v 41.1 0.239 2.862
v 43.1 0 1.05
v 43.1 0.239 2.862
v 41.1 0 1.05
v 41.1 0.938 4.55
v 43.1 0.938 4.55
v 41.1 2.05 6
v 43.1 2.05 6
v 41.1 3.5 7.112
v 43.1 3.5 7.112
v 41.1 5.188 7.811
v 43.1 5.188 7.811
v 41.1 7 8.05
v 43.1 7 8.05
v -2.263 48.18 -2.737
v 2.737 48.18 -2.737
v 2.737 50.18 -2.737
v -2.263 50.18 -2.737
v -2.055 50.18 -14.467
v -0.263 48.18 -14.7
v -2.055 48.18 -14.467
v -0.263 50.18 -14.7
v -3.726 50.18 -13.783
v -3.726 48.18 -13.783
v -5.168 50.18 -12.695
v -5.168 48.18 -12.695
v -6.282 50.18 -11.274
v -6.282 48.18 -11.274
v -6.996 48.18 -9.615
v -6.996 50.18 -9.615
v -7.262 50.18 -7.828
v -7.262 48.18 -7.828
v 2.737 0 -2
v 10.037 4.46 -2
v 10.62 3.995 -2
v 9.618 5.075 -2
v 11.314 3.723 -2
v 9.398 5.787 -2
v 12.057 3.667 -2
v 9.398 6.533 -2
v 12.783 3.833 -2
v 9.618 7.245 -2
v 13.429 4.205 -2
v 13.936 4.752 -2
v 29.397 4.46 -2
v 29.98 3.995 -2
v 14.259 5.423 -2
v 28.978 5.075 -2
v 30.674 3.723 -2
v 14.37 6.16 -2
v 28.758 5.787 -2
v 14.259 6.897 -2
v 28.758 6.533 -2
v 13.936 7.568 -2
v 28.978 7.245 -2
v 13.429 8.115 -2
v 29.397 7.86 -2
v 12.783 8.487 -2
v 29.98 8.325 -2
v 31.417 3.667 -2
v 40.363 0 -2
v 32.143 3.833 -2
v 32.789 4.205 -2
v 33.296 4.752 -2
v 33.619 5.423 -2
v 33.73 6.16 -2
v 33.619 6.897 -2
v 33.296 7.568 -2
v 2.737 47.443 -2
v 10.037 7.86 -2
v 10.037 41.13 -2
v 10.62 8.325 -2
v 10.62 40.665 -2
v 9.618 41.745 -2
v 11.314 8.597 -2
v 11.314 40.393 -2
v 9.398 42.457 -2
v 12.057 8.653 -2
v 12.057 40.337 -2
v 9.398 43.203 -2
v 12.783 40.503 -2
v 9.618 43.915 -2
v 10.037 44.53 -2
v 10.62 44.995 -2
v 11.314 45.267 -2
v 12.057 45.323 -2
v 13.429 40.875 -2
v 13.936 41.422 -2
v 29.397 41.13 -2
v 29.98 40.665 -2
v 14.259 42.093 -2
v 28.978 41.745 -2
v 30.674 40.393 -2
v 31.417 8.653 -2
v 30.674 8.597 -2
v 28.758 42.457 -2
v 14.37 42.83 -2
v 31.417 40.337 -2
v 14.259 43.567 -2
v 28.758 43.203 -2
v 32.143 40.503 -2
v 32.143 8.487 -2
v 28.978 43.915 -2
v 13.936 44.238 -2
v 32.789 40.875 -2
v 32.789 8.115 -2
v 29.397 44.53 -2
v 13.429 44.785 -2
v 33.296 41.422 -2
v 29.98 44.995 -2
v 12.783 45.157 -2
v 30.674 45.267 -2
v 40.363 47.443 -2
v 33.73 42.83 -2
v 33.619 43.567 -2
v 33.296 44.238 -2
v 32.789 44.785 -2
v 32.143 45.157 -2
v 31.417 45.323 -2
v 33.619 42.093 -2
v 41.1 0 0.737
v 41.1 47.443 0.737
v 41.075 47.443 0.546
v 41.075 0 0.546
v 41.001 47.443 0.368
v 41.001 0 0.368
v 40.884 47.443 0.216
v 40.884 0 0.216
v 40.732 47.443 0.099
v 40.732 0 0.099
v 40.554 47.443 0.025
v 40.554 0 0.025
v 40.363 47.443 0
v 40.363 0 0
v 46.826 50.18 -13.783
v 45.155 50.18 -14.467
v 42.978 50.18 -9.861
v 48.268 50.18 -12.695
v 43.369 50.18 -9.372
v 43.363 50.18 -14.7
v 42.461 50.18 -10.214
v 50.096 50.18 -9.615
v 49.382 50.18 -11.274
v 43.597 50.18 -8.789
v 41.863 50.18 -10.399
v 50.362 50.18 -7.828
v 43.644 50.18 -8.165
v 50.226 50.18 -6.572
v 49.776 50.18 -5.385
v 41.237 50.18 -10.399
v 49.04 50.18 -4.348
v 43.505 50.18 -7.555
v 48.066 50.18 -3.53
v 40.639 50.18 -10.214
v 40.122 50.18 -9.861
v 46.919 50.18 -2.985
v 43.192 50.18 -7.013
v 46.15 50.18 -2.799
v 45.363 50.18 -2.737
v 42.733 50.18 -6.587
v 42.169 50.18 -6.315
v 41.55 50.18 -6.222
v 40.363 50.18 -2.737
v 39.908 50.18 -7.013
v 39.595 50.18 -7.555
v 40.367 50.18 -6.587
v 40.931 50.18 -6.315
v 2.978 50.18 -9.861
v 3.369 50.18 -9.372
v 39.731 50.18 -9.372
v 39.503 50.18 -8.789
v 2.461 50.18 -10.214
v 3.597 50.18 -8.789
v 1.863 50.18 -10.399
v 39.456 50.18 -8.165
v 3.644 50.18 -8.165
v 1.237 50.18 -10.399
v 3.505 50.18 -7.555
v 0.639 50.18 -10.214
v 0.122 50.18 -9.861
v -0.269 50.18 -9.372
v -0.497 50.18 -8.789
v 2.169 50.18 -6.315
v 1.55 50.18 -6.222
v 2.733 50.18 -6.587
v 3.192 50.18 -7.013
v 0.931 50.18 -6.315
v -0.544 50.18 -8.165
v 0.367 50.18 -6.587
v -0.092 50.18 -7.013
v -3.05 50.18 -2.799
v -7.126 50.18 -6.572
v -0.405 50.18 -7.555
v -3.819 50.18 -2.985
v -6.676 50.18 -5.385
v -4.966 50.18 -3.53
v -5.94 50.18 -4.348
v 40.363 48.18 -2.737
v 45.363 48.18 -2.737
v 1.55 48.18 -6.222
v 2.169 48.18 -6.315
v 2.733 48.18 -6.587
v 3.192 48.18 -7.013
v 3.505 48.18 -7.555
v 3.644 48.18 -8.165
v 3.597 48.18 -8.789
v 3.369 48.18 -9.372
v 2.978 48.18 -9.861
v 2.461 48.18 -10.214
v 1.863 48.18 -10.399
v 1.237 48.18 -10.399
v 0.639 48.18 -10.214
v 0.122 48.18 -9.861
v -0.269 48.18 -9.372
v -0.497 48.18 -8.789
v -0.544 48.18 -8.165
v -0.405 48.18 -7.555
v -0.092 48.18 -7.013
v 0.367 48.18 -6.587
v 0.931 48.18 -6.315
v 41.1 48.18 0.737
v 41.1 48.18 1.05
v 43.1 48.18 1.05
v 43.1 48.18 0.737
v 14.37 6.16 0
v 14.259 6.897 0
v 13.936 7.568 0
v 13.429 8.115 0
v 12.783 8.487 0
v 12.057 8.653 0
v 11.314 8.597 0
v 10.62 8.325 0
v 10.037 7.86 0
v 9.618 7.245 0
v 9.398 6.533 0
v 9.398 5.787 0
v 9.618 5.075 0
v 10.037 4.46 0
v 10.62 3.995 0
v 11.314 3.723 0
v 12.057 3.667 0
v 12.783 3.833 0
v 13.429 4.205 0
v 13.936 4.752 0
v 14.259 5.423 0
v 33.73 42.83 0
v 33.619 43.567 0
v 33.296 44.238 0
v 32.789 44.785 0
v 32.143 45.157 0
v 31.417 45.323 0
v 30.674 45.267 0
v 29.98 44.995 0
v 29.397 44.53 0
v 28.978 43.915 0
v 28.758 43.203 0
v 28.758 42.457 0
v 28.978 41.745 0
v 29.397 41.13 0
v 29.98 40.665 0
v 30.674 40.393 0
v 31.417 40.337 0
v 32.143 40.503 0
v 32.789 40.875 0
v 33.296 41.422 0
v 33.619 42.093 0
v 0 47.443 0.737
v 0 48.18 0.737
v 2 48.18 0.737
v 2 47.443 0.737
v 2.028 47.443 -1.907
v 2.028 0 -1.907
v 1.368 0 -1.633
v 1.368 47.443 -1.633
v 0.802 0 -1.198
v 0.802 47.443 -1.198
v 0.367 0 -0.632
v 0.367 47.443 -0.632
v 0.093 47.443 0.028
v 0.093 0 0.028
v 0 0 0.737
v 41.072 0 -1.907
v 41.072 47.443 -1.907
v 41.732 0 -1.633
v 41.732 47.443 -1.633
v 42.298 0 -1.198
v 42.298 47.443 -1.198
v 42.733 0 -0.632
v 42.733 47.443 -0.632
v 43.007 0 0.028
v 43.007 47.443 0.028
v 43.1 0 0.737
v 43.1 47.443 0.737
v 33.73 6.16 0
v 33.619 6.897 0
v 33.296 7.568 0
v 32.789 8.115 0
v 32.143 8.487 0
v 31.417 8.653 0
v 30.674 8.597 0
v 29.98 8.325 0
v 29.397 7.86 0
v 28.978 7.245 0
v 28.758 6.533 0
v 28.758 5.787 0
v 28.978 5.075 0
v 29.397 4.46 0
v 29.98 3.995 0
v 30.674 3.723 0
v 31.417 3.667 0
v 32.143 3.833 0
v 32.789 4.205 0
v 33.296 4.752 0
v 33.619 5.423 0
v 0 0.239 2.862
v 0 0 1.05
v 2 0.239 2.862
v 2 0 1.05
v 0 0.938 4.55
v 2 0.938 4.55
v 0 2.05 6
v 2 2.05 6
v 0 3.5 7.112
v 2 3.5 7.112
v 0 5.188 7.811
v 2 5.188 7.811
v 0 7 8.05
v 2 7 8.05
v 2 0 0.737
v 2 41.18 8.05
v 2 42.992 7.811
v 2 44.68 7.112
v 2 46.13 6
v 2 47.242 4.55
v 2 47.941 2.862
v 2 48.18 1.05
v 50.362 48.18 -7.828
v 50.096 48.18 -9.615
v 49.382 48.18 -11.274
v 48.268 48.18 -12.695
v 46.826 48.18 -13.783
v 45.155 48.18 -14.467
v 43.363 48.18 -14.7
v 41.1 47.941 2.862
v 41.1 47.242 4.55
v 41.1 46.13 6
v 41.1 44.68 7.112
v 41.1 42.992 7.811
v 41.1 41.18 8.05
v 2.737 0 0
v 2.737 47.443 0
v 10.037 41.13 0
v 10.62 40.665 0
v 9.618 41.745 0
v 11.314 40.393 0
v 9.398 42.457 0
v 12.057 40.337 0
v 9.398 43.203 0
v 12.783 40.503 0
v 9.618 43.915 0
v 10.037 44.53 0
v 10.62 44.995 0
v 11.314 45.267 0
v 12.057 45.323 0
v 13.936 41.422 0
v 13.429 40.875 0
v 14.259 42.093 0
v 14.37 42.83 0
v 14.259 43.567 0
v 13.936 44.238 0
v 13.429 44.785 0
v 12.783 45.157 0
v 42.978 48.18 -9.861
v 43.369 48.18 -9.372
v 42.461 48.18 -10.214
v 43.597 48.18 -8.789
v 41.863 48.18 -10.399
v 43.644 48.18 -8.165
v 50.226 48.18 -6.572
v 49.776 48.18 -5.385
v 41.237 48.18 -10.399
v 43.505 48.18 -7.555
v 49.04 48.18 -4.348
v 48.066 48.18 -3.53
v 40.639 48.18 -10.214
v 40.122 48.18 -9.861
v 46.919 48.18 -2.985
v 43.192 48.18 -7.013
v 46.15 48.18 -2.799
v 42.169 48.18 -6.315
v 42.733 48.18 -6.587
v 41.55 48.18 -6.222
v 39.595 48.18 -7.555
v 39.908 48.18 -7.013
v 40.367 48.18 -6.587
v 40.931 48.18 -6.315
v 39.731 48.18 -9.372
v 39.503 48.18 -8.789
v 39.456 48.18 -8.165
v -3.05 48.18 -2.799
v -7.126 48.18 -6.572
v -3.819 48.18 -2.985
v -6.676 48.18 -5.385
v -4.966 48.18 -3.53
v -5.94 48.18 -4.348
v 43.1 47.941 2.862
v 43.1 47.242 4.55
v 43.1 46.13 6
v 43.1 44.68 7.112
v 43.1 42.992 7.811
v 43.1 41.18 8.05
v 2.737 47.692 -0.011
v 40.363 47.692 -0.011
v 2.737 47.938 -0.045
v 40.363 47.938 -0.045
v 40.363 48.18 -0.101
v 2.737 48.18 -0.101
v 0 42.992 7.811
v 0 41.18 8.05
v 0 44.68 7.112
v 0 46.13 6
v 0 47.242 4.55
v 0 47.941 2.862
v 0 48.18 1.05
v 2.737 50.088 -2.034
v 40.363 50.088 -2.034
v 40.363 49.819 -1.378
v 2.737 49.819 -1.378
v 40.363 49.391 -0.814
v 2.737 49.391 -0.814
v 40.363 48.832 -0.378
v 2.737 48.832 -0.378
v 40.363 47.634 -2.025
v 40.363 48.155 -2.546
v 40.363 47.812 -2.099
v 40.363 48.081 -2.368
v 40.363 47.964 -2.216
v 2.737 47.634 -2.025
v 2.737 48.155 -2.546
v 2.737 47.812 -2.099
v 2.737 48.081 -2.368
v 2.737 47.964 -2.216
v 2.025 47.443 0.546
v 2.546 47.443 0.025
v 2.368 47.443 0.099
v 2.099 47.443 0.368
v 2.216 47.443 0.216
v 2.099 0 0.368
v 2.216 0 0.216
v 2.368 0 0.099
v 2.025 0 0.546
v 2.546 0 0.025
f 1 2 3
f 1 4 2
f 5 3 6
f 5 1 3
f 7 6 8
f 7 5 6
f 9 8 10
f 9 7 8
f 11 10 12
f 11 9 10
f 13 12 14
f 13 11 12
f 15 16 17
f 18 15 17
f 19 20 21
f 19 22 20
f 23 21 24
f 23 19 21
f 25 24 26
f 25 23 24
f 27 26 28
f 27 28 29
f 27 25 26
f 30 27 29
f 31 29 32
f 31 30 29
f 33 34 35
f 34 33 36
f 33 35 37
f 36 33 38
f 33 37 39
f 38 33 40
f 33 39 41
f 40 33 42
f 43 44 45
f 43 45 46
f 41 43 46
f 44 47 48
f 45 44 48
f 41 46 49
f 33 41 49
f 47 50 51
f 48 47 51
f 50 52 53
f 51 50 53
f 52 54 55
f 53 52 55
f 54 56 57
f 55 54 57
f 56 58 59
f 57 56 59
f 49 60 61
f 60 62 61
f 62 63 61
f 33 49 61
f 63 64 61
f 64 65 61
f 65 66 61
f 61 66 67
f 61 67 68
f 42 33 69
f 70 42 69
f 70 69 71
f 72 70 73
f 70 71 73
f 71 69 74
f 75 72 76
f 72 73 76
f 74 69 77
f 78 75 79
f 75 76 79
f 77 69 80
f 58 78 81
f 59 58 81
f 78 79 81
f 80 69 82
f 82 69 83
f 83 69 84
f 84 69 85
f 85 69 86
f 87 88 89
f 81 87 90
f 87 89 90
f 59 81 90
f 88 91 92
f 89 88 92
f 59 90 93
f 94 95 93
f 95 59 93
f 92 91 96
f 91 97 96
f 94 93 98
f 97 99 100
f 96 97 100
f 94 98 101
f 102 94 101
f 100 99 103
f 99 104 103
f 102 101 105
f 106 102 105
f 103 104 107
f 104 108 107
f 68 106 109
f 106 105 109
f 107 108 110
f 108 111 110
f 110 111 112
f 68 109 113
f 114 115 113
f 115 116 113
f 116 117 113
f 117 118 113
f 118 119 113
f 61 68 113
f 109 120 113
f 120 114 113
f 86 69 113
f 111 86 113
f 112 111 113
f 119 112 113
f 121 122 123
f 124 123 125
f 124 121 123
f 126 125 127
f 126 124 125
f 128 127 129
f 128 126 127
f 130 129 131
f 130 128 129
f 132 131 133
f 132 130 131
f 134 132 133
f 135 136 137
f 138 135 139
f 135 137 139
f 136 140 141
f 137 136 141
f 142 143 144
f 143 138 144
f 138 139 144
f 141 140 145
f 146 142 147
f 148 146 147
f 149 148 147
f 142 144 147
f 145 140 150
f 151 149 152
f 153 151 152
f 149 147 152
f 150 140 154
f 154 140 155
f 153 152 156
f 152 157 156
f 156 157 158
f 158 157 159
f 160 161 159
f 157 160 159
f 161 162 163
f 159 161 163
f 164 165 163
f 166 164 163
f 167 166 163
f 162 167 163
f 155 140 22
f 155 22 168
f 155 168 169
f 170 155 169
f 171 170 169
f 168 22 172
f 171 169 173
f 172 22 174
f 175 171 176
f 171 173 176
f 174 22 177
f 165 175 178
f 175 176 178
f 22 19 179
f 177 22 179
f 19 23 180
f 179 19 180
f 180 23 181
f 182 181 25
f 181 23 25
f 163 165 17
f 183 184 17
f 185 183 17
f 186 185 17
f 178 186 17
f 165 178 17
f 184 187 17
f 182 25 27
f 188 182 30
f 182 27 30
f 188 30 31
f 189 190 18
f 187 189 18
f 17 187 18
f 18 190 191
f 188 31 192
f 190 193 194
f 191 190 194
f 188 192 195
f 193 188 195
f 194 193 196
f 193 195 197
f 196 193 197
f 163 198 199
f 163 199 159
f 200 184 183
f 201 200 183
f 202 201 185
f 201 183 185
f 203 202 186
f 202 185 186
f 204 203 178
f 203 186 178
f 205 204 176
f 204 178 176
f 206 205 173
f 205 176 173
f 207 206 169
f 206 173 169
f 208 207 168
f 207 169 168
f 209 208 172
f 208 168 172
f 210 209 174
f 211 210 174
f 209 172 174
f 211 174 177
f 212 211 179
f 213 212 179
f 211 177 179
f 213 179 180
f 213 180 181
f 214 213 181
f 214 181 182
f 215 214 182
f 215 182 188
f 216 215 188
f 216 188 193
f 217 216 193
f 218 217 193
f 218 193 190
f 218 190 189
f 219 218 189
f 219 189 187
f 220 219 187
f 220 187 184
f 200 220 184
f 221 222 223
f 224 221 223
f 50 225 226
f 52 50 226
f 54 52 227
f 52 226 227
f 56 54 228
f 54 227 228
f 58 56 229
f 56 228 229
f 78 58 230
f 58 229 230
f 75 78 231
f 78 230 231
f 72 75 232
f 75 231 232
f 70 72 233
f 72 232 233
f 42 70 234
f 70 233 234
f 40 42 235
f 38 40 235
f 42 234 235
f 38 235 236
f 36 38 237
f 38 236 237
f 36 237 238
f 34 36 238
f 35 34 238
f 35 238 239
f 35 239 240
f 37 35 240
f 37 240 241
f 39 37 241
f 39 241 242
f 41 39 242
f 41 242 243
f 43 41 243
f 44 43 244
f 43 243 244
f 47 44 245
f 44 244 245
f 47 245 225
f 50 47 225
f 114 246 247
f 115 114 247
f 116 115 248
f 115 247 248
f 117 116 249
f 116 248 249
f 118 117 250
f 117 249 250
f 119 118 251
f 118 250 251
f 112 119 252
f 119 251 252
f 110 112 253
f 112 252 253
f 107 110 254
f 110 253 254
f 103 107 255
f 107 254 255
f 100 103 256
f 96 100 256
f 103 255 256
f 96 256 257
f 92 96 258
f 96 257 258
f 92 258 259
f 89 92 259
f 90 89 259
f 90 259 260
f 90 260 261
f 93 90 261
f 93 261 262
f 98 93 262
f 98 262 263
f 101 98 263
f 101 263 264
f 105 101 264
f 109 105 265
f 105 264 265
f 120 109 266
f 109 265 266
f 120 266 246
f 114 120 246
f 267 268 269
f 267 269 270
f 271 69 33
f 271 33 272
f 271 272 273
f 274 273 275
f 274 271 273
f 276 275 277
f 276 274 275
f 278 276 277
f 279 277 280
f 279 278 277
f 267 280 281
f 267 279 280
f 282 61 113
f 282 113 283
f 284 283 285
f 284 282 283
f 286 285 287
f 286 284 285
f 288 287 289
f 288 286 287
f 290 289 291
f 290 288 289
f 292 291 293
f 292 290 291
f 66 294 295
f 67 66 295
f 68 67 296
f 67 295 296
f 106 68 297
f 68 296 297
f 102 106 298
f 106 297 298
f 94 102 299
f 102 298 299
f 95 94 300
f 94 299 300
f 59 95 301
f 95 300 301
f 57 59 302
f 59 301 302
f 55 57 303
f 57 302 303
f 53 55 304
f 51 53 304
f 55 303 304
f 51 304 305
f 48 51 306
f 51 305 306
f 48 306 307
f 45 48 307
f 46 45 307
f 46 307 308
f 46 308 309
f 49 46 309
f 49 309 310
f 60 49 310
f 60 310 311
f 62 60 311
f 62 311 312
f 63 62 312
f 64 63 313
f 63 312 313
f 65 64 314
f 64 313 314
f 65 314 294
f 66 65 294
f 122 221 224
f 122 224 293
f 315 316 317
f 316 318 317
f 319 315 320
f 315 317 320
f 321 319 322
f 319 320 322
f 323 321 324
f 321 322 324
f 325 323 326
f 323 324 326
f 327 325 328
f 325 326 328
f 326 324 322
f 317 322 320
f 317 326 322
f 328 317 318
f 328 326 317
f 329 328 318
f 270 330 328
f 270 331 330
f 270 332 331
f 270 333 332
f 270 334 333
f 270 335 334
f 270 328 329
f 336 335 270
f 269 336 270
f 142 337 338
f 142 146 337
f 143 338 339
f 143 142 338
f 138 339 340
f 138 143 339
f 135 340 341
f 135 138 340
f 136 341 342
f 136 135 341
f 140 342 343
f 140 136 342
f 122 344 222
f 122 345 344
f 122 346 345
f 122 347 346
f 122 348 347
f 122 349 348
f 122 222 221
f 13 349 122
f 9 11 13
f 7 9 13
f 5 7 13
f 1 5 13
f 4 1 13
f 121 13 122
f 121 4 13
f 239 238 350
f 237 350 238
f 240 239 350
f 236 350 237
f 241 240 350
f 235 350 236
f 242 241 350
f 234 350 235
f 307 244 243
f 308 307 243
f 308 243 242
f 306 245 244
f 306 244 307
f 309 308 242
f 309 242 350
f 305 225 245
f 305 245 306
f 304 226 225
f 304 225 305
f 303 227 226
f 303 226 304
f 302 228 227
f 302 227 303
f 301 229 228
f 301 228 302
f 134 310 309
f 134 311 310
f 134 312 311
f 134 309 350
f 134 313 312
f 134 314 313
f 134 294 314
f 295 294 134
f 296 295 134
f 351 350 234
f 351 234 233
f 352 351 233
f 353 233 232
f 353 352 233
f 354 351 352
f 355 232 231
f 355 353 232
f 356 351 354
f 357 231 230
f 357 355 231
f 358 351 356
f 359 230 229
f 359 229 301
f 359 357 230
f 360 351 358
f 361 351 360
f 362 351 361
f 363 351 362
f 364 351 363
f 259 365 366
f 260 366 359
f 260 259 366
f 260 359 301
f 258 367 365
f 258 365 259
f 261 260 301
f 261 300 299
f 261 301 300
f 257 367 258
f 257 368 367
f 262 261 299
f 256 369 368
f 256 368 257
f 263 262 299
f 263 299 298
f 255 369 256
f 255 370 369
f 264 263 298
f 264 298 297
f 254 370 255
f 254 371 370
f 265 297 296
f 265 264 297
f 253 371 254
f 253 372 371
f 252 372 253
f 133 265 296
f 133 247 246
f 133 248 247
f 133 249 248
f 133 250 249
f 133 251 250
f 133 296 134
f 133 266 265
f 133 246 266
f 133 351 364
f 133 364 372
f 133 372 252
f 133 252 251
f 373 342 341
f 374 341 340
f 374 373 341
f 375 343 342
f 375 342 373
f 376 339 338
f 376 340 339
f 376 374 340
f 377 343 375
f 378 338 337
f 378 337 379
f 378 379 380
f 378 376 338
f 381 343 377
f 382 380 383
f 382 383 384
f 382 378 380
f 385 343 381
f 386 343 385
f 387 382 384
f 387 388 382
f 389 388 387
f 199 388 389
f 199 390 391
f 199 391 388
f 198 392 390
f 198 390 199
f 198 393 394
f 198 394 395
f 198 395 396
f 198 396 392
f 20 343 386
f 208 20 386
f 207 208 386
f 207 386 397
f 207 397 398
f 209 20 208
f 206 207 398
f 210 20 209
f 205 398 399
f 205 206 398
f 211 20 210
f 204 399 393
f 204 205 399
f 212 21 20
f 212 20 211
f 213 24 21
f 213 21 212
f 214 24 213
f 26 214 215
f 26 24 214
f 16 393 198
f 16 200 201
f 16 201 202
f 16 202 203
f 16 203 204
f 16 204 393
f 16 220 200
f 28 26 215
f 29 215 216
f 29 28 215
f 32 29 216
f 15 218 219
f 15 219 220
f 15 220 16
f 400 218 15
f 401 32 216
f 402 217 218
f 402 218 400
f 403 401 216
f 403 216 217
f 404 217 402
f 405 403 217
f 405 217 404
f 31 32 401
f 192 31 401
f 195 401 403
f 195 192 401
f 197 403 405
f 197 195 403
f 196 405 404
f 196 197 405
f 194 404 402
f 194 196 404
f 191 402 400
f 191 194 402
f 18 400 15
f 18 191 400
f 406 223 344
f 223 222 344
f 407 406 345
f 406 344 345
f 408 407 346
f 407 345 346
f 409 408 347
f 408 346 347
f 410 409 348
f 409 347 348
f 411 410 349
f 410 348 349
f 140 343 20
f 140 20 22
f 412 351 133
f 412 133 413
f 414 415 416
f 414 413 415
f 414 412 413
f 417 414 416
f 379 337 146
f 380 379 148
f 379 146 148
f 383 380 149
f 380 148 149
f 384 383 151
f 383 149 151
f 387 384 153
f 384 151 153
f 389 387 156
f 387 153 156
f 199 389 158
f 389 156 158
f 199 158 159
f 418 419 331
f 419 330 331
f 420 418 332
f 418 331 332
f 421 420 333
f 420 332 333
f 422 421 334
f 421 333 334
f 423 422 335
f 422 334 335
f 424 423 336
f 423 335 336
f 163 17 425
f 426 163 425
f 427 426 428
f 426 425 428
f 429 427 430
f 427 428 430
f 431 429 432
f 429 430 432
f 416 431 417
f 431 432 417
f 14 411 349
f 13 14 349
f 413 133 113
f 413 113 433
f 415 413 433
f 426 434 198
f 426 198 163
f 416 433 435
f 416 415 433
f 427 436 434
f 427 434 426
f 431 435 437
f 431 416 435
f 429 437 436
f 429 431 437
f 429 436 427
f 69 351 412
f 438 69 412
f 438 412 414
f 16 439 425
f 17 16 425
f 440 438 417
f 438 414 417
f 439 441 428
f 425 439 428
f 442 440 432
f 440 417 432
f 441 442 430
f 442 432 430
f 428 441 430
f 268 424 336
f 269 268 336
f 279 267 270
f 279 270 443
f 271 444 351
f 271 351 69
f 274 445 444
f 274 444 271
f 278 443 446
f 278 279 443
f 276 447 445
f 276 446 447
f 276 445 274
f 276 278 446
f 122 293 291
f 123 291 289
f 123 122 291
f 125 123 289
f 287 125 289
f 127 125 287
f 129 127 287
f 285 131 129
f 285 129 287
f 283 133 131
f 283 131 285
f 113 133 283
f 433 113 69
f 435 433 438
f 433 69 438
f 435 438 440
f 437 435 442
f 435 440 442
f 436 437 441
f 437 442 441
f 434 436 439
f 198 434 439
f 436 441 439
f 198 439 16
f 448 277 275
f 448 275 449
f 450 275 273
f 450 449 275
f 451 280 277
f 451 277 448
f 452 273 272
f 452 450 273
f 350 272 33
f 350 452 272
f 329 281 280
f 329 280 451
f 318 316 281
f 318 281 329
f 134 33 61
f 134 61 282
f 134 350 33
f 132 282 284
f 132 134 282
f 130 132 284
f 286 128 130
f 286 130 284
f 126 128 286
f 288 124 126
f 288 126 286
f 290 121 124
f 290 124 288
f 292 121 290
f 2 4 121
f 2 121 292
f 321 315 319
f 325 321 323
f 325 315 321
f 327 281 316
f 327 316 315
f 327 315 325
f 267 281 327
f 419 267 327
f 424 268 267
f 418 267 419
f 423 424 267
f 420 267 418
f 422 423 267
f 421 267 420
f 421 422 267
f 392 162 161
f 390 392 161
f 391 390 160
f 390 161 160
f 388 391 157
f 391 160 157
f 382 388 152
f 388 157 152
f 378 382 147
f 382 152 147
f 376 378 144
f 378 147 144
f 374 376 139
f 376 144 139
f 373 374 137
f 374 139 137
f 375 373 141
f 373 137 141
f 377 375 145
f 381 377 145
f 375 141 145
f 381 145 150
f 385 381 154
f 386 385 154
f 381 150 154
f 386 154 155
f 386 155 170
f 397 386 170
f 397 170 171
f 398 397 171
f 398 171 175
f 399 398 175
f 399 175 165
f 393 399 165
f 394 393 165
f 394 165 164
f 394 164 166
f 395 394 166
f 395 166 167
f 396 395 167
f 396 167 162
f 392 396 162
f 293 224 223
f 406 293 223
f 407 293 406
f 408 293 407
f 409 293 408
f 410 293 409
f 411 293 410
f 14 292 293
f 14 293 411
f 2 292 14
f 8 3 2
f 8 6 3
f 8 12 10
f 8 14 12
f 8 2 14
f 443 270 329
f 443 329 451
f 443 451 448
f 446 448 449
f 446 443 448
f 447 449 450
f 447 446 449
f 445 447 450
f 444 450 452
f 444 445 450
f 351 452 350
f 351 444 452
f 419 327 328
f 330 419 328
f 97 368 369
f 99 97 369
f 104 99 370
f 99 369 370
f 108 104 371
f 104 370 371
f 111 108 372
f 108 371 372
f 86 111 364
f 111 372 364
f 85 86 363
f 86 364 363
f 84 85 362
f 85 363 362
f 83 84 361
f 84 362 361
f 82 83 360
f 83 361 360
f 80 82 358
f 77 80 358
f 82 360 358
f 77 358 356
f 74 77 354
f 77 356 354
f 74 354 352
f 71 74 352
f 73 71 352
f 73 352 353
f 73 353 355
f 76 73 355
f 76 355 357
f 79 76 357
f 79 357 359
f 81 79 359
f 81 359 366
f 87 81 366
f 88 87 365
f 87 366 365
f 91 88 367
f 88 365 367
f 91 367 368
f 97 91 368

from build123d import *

# Parameters (mm, degrees)
SKETCH6_W                      = 43.1
SKETCH6_H                      = 48.18
SKETCH6_R                      = 2.5
BASE_FLANGE2_DEPTH             = 2
EDGE_FLANGE1_STRIP_W           = 9.4732
EDGE_FLANGE1_STRIP_H           = 2
EDGE_FLANGE1_STRIP_CUT_DEPTH   = 48.18
EDGE_FLANGE1_STRIP_2_W         = 9.4732
EDGE_FLANGE1_STRIP_2_H         = 2
EDGE_FLANGE1_STRIP_CUT_2_DEPTH = 48.18
EDGE_FLANGE1_DEPTH             = 48.18
EDGE_FLANGE1_BEND_DEPTH        = 48.18
EDGE_FLANGE3_DEPTH             = 43.1
EDGE_FLANGE3_2_DEPTH           = 2.7366
EDGE_FLANGE3_START             = 40.3634
EDGE_FLANGE3_3_DEPTH           = 2.7366
EDGE_FLANGE3_START_2           = -7.2634
EDGE_FLANGE3_4_OUTLINE_W       = 2
EDGE_FLANGE3_4_OUTLINE_H       = 11.9634
EDGE_FLANGE3_4_DEPTH           = 57.6268
EDGE_FLANGE3_START_3           = 2.7366
EDGE_FLANGE3_5_DEPTH           = 37.6268
FILLET3_R                      = 7
CUT_EXTRUDE1_REACH             = 74.599
SKETCH21_R                     = 2.1
FILLET4_R                      = 5


# Read off the part's stored shape, not the designer's step: Edge-Flange3
# Sheet-metal steps are written as plain solids
with BuildPart() as part:
    # Sketch6 → Base-Flange2 (new body)
    with BuildSketch(Plane.XY):
        with Locations((21.55, 24.09)):
            Rectangle(SKETCH6_W, SKETCH6_H)
        with Locations((31.23, 6.16)):
            Circle(SKETCH6_R, mode=Mode.SUBTRACT)
        with Locations((11.87, 6.16)):
            Circle(SKETCH6_R, mode=Mode.SUBTRACT)
        with Locations((11.87, 42.83)):
            Circle(SKETCH6_R, mode=Mode.SUBTRACT)
        with Locations((31.23, 42.83)):
            Circle(SKETCH6_R, mode=Mode.SUBTRACT)
    extrude(amount=-BASE_FLANGE2_DEPTH)

    # Edge-Flange1 strip (across the edge) → Edge-Flange1 strip cut (cut)
    with BuildSketch(Plane.XZ.offset(-48.18)):
        with Locations((-2, -1)):
            Rectangle(EDGE_FLANGE1_STRIP_W, EDGE_FLANGE1_STRIP_H)
    extrude(amount=EDGE_FLANGE1_STRIP_CUT_DEPTH, mode=Mode.SUBTRACT)

    # Edge-Flange1 strip 2 (across the edge) → Edge-Flange1 strip cut 2 (cut)
    with BuildSketch(Plane(origin=(43.1, 0, 0), x_dir=(-1, 0, 0), z_dir=(0, 1, 0))):
        with Locations((-2, -1)):
            Rectangle(EDGE_FLANGE1_STRIP_2_W, EDGE_FLANGE1_STRIP_2_H)
    extrude(amount=EDGE_FLANGE1_STRIP_CUT_2_DEPTH, mode=Mode.SUBTRACT)

    # Edge-Flange1 section (across the edge) → Edge-Flange1 (add)
    with BuildSketch(Plane.XZ.offset(-48.18)):
        with BuildLine():
            Line((0, 0.7366), (0, 8.05))
            Line((0, 8.05), (2, 8.05))
            Line((2, 8.05), (2, 0.7366))
            ThreePointArc((2, 0.7366), (2.215745145, 0.215745145), (2.7366, 0))
            Line((2.7366, 0), (2.7366, -2))
            ThreePointArc((2.7366, -2), (0.801531583, -1.198468417), (0, 0.7366))
        make_face()
    extrude(amount=EDGE_FLANGE1_DEPTH)

    # Edge-Flange1 section 2 (across the edge) → Edge-Flange1 bend (add)
    with BuildSketch(Plane(origin=(43.1, 0, 0), x_dir=(-1, 0, 0), z_dir=(0, 1, 0))):
        with BuildLine():
            Line((0, 0.7366), (0, 8.05))
            Line((0, 8.05), (2, 8.05))
            Line((2, 8.05), (2, 0.7366))
            ThreePointArc((2, 0.7366), (2.215745145, 0.215745145), (2.7366, 0))
            Line((2.7366, 0), (2.7366, -2))
            ThreePointArc((2.7366, -2), (0.801531583, -1.198468417), (0, 0.7366))
        make_face()
    extrude(amount=EDGE_FLANGE1_BEND_DEPTH)

    # Edge-Flange3 outline → Edge-Flange3 (cut)
    with BuildSketch(Plane.YZ):
        with BuildLine():
            Line((48.18, 0.7366), (47.4434, 0.7366))
            Line((47.4434, 0.7366), (47.4434, 0))
            ThreePointArc((47.4434, 0), (47.815145906, -0.025366971), (48.18, -0.100997602))
            Line((48.18, -0.100997602), (48.18, 0.7366))
        make_face()
    extrude(amount=EDGE_FLANGE3_DEPTH, mode=Mode.SUBTRACT)

    # Edge-Flange3 2 outline → Edge-Flange3 2 (cut)
    with BuildSketch(Plane.YZ):
        with BuildLine():
            ThreePointArc((48.18, -0.100997602), (47.815145906, -0.025366971), (47.4434, 0))
            Line((47.4434, 0), (47.4434, -2))
            ThreePointArc((47.4434, -2), (47.964254855, -2.215745145), (48.18, -2.7366))
            Line((48.18, -2.7366), (50.18, -2.7366))
            ThreePointArc((50.18, -2.7366), (49.623395312, -1.082332791), (48.18, -0.100997602))
        make_face()
    extrude(amount=EDGE_FLANGE3_2_DEPTH, mode=Mode.SUBTRACT)

    # Edge-Flange3 3 outline → Edge-Flange3 3 (cut)
    with BuildSketch(Plane.YZ.offset(EDGE_FLANGE3_START)):
        with BuildLine():
            ThreePointArc((48.18, -0.100997602), (47.815145906, -0.025366971), (47.4434, 0))
            Line((47.4434, 0), (47.4434, -2))
            ThreePointArc((47.4434, -2), (47.964254855, -2.215745145), (48.18, -2.7366))
            Line((48.18, -2.7366), (50.18, -2.7366))
            ThreePointArc((50.18, -2.7366), (49.623395312, -1.082332791), (48.18, -0.100997602))
        make_face()
    extrude(amount=EDGE_FLANGE3_3_DEPTH, mode=Mode.SUBTRACT)



with BuildPart() as body_2:
    # Edge-Flange3 4 outline → Edge-Flange3 4 (new body)
    with BuildSketch(Plane.YZ.offset(EDGE_FLANGE3_START_2)):
        with Locations((49.18, -8.7183)):
            Rectangle(EDGE_FLANGE3_4_OUTLINE_W, EDGE_FLANGE3_4_OUTLINE_H)
    extrude(amount=EDGE_FLANGE3_4_DEPTH)


with BuildPart() as part_1:
    add(part.part)

    add(body_2.part)  # Edge-Flange3 5 merges body 2
    # Edge-Flange3 5 outline → Edge-Flange3 5 (add)
    with BuildSketch(Plane.YZ.offset(EDGE_FLANGE3_START_3)):
        with BuildLine():
            ThreePointArc((48.18, -0.100997602), (47.815145906, -0.025366971), (47.4434, 0))
            Line((47.4434, 0), (47.4434, -2))
            ThreePointArc((47.4434, -2), (47.964254855, -2.215745145), (48.18, -2.7366))
            Line((48.18, -2.7366), (50.18, -2.7366))
            ThreePointArc((50.18, -2.7366), (49.623395312, -1.082332791), (48.18, -0.100997602))
        make_face()
    extrude(amount=EDGE_FLANGE3_5_DEPTH)

    # Fillet3
    fillet3_edges = [part_1.edges().sort_by_distance(p)[0] for p in [
        (-7.2634, 49.18, -14.7),
        (50.3634, 49.18, -14.7),
        (1, 48.18, 8.05),
        (1, 0, 8.05),
        (42.1, 0, 8.05),
        (42.1, 48.18, 8.05),
    ]]
    fillet(fillet3_edges, radius=FILLET3_R)

    # Sketch21 → Cut-Extrude1 (cut, up to next)
    with BuildSketch(Plane(origin=(0, 50.18, 0), x_dir=(1, 0, 0), z_dir=(0, 1, 0)), mode=Mode.PRIVATE) as cut_extrude1_sk1:
        with Locations(Location((1.55, 8.322080502, 0), (0, 0, 270))):
            Circle(SKETCH21_R)
    cut_extrude1_tool1 = extrude(cut_extrude1_sk1.sketch, amount=-CUT_EXTRUDE1_REACH, mode=Mode.PRIVATE) & part_1.part
    # Sketch21 → Cut-Extrude1 (cut, up to next)
    with BuildSketch(Plane(origin=(0, 50.18, 0), x_dir=(1, 0, 0), z_dir=(0, 1, 0)), mode=Mode.PRIVATE) as cut_extrude1_sk2:
        with Locations(Location((41.55, 8.322080502, 0), (0, 0, 270))):
            Circle(SKETCH21_R)
    cut_extrude1_tool2 = extrude(cut_extrude1_sk2.sketch, amount=-CUT_EXTRUDE1_REACH, mode=Mode.PRIVATE) & part_1.part
    add(cut_extrude1_tool1.solids().sort_by_distance((1.55, 50.18, -8.322081))[0], mode=Mode.SUBTRACT)
    add(cut_extrude1_tool2.solids().sort_by_distance((41.55, 50.18, -8.322081))[0], mode=Mode.SUBTRACT)

    # Fillet4
    fillet4_edges = [part_1.edges().sort_by_distance(p)[0] for p in [
        (50.3634, 49.18, -2.7366),
        (-7.2634, 49.18, -2.7366),
    ]]
    fillet(fillet4_edges, radius=FILLET4_R)


solid = part_1.part
